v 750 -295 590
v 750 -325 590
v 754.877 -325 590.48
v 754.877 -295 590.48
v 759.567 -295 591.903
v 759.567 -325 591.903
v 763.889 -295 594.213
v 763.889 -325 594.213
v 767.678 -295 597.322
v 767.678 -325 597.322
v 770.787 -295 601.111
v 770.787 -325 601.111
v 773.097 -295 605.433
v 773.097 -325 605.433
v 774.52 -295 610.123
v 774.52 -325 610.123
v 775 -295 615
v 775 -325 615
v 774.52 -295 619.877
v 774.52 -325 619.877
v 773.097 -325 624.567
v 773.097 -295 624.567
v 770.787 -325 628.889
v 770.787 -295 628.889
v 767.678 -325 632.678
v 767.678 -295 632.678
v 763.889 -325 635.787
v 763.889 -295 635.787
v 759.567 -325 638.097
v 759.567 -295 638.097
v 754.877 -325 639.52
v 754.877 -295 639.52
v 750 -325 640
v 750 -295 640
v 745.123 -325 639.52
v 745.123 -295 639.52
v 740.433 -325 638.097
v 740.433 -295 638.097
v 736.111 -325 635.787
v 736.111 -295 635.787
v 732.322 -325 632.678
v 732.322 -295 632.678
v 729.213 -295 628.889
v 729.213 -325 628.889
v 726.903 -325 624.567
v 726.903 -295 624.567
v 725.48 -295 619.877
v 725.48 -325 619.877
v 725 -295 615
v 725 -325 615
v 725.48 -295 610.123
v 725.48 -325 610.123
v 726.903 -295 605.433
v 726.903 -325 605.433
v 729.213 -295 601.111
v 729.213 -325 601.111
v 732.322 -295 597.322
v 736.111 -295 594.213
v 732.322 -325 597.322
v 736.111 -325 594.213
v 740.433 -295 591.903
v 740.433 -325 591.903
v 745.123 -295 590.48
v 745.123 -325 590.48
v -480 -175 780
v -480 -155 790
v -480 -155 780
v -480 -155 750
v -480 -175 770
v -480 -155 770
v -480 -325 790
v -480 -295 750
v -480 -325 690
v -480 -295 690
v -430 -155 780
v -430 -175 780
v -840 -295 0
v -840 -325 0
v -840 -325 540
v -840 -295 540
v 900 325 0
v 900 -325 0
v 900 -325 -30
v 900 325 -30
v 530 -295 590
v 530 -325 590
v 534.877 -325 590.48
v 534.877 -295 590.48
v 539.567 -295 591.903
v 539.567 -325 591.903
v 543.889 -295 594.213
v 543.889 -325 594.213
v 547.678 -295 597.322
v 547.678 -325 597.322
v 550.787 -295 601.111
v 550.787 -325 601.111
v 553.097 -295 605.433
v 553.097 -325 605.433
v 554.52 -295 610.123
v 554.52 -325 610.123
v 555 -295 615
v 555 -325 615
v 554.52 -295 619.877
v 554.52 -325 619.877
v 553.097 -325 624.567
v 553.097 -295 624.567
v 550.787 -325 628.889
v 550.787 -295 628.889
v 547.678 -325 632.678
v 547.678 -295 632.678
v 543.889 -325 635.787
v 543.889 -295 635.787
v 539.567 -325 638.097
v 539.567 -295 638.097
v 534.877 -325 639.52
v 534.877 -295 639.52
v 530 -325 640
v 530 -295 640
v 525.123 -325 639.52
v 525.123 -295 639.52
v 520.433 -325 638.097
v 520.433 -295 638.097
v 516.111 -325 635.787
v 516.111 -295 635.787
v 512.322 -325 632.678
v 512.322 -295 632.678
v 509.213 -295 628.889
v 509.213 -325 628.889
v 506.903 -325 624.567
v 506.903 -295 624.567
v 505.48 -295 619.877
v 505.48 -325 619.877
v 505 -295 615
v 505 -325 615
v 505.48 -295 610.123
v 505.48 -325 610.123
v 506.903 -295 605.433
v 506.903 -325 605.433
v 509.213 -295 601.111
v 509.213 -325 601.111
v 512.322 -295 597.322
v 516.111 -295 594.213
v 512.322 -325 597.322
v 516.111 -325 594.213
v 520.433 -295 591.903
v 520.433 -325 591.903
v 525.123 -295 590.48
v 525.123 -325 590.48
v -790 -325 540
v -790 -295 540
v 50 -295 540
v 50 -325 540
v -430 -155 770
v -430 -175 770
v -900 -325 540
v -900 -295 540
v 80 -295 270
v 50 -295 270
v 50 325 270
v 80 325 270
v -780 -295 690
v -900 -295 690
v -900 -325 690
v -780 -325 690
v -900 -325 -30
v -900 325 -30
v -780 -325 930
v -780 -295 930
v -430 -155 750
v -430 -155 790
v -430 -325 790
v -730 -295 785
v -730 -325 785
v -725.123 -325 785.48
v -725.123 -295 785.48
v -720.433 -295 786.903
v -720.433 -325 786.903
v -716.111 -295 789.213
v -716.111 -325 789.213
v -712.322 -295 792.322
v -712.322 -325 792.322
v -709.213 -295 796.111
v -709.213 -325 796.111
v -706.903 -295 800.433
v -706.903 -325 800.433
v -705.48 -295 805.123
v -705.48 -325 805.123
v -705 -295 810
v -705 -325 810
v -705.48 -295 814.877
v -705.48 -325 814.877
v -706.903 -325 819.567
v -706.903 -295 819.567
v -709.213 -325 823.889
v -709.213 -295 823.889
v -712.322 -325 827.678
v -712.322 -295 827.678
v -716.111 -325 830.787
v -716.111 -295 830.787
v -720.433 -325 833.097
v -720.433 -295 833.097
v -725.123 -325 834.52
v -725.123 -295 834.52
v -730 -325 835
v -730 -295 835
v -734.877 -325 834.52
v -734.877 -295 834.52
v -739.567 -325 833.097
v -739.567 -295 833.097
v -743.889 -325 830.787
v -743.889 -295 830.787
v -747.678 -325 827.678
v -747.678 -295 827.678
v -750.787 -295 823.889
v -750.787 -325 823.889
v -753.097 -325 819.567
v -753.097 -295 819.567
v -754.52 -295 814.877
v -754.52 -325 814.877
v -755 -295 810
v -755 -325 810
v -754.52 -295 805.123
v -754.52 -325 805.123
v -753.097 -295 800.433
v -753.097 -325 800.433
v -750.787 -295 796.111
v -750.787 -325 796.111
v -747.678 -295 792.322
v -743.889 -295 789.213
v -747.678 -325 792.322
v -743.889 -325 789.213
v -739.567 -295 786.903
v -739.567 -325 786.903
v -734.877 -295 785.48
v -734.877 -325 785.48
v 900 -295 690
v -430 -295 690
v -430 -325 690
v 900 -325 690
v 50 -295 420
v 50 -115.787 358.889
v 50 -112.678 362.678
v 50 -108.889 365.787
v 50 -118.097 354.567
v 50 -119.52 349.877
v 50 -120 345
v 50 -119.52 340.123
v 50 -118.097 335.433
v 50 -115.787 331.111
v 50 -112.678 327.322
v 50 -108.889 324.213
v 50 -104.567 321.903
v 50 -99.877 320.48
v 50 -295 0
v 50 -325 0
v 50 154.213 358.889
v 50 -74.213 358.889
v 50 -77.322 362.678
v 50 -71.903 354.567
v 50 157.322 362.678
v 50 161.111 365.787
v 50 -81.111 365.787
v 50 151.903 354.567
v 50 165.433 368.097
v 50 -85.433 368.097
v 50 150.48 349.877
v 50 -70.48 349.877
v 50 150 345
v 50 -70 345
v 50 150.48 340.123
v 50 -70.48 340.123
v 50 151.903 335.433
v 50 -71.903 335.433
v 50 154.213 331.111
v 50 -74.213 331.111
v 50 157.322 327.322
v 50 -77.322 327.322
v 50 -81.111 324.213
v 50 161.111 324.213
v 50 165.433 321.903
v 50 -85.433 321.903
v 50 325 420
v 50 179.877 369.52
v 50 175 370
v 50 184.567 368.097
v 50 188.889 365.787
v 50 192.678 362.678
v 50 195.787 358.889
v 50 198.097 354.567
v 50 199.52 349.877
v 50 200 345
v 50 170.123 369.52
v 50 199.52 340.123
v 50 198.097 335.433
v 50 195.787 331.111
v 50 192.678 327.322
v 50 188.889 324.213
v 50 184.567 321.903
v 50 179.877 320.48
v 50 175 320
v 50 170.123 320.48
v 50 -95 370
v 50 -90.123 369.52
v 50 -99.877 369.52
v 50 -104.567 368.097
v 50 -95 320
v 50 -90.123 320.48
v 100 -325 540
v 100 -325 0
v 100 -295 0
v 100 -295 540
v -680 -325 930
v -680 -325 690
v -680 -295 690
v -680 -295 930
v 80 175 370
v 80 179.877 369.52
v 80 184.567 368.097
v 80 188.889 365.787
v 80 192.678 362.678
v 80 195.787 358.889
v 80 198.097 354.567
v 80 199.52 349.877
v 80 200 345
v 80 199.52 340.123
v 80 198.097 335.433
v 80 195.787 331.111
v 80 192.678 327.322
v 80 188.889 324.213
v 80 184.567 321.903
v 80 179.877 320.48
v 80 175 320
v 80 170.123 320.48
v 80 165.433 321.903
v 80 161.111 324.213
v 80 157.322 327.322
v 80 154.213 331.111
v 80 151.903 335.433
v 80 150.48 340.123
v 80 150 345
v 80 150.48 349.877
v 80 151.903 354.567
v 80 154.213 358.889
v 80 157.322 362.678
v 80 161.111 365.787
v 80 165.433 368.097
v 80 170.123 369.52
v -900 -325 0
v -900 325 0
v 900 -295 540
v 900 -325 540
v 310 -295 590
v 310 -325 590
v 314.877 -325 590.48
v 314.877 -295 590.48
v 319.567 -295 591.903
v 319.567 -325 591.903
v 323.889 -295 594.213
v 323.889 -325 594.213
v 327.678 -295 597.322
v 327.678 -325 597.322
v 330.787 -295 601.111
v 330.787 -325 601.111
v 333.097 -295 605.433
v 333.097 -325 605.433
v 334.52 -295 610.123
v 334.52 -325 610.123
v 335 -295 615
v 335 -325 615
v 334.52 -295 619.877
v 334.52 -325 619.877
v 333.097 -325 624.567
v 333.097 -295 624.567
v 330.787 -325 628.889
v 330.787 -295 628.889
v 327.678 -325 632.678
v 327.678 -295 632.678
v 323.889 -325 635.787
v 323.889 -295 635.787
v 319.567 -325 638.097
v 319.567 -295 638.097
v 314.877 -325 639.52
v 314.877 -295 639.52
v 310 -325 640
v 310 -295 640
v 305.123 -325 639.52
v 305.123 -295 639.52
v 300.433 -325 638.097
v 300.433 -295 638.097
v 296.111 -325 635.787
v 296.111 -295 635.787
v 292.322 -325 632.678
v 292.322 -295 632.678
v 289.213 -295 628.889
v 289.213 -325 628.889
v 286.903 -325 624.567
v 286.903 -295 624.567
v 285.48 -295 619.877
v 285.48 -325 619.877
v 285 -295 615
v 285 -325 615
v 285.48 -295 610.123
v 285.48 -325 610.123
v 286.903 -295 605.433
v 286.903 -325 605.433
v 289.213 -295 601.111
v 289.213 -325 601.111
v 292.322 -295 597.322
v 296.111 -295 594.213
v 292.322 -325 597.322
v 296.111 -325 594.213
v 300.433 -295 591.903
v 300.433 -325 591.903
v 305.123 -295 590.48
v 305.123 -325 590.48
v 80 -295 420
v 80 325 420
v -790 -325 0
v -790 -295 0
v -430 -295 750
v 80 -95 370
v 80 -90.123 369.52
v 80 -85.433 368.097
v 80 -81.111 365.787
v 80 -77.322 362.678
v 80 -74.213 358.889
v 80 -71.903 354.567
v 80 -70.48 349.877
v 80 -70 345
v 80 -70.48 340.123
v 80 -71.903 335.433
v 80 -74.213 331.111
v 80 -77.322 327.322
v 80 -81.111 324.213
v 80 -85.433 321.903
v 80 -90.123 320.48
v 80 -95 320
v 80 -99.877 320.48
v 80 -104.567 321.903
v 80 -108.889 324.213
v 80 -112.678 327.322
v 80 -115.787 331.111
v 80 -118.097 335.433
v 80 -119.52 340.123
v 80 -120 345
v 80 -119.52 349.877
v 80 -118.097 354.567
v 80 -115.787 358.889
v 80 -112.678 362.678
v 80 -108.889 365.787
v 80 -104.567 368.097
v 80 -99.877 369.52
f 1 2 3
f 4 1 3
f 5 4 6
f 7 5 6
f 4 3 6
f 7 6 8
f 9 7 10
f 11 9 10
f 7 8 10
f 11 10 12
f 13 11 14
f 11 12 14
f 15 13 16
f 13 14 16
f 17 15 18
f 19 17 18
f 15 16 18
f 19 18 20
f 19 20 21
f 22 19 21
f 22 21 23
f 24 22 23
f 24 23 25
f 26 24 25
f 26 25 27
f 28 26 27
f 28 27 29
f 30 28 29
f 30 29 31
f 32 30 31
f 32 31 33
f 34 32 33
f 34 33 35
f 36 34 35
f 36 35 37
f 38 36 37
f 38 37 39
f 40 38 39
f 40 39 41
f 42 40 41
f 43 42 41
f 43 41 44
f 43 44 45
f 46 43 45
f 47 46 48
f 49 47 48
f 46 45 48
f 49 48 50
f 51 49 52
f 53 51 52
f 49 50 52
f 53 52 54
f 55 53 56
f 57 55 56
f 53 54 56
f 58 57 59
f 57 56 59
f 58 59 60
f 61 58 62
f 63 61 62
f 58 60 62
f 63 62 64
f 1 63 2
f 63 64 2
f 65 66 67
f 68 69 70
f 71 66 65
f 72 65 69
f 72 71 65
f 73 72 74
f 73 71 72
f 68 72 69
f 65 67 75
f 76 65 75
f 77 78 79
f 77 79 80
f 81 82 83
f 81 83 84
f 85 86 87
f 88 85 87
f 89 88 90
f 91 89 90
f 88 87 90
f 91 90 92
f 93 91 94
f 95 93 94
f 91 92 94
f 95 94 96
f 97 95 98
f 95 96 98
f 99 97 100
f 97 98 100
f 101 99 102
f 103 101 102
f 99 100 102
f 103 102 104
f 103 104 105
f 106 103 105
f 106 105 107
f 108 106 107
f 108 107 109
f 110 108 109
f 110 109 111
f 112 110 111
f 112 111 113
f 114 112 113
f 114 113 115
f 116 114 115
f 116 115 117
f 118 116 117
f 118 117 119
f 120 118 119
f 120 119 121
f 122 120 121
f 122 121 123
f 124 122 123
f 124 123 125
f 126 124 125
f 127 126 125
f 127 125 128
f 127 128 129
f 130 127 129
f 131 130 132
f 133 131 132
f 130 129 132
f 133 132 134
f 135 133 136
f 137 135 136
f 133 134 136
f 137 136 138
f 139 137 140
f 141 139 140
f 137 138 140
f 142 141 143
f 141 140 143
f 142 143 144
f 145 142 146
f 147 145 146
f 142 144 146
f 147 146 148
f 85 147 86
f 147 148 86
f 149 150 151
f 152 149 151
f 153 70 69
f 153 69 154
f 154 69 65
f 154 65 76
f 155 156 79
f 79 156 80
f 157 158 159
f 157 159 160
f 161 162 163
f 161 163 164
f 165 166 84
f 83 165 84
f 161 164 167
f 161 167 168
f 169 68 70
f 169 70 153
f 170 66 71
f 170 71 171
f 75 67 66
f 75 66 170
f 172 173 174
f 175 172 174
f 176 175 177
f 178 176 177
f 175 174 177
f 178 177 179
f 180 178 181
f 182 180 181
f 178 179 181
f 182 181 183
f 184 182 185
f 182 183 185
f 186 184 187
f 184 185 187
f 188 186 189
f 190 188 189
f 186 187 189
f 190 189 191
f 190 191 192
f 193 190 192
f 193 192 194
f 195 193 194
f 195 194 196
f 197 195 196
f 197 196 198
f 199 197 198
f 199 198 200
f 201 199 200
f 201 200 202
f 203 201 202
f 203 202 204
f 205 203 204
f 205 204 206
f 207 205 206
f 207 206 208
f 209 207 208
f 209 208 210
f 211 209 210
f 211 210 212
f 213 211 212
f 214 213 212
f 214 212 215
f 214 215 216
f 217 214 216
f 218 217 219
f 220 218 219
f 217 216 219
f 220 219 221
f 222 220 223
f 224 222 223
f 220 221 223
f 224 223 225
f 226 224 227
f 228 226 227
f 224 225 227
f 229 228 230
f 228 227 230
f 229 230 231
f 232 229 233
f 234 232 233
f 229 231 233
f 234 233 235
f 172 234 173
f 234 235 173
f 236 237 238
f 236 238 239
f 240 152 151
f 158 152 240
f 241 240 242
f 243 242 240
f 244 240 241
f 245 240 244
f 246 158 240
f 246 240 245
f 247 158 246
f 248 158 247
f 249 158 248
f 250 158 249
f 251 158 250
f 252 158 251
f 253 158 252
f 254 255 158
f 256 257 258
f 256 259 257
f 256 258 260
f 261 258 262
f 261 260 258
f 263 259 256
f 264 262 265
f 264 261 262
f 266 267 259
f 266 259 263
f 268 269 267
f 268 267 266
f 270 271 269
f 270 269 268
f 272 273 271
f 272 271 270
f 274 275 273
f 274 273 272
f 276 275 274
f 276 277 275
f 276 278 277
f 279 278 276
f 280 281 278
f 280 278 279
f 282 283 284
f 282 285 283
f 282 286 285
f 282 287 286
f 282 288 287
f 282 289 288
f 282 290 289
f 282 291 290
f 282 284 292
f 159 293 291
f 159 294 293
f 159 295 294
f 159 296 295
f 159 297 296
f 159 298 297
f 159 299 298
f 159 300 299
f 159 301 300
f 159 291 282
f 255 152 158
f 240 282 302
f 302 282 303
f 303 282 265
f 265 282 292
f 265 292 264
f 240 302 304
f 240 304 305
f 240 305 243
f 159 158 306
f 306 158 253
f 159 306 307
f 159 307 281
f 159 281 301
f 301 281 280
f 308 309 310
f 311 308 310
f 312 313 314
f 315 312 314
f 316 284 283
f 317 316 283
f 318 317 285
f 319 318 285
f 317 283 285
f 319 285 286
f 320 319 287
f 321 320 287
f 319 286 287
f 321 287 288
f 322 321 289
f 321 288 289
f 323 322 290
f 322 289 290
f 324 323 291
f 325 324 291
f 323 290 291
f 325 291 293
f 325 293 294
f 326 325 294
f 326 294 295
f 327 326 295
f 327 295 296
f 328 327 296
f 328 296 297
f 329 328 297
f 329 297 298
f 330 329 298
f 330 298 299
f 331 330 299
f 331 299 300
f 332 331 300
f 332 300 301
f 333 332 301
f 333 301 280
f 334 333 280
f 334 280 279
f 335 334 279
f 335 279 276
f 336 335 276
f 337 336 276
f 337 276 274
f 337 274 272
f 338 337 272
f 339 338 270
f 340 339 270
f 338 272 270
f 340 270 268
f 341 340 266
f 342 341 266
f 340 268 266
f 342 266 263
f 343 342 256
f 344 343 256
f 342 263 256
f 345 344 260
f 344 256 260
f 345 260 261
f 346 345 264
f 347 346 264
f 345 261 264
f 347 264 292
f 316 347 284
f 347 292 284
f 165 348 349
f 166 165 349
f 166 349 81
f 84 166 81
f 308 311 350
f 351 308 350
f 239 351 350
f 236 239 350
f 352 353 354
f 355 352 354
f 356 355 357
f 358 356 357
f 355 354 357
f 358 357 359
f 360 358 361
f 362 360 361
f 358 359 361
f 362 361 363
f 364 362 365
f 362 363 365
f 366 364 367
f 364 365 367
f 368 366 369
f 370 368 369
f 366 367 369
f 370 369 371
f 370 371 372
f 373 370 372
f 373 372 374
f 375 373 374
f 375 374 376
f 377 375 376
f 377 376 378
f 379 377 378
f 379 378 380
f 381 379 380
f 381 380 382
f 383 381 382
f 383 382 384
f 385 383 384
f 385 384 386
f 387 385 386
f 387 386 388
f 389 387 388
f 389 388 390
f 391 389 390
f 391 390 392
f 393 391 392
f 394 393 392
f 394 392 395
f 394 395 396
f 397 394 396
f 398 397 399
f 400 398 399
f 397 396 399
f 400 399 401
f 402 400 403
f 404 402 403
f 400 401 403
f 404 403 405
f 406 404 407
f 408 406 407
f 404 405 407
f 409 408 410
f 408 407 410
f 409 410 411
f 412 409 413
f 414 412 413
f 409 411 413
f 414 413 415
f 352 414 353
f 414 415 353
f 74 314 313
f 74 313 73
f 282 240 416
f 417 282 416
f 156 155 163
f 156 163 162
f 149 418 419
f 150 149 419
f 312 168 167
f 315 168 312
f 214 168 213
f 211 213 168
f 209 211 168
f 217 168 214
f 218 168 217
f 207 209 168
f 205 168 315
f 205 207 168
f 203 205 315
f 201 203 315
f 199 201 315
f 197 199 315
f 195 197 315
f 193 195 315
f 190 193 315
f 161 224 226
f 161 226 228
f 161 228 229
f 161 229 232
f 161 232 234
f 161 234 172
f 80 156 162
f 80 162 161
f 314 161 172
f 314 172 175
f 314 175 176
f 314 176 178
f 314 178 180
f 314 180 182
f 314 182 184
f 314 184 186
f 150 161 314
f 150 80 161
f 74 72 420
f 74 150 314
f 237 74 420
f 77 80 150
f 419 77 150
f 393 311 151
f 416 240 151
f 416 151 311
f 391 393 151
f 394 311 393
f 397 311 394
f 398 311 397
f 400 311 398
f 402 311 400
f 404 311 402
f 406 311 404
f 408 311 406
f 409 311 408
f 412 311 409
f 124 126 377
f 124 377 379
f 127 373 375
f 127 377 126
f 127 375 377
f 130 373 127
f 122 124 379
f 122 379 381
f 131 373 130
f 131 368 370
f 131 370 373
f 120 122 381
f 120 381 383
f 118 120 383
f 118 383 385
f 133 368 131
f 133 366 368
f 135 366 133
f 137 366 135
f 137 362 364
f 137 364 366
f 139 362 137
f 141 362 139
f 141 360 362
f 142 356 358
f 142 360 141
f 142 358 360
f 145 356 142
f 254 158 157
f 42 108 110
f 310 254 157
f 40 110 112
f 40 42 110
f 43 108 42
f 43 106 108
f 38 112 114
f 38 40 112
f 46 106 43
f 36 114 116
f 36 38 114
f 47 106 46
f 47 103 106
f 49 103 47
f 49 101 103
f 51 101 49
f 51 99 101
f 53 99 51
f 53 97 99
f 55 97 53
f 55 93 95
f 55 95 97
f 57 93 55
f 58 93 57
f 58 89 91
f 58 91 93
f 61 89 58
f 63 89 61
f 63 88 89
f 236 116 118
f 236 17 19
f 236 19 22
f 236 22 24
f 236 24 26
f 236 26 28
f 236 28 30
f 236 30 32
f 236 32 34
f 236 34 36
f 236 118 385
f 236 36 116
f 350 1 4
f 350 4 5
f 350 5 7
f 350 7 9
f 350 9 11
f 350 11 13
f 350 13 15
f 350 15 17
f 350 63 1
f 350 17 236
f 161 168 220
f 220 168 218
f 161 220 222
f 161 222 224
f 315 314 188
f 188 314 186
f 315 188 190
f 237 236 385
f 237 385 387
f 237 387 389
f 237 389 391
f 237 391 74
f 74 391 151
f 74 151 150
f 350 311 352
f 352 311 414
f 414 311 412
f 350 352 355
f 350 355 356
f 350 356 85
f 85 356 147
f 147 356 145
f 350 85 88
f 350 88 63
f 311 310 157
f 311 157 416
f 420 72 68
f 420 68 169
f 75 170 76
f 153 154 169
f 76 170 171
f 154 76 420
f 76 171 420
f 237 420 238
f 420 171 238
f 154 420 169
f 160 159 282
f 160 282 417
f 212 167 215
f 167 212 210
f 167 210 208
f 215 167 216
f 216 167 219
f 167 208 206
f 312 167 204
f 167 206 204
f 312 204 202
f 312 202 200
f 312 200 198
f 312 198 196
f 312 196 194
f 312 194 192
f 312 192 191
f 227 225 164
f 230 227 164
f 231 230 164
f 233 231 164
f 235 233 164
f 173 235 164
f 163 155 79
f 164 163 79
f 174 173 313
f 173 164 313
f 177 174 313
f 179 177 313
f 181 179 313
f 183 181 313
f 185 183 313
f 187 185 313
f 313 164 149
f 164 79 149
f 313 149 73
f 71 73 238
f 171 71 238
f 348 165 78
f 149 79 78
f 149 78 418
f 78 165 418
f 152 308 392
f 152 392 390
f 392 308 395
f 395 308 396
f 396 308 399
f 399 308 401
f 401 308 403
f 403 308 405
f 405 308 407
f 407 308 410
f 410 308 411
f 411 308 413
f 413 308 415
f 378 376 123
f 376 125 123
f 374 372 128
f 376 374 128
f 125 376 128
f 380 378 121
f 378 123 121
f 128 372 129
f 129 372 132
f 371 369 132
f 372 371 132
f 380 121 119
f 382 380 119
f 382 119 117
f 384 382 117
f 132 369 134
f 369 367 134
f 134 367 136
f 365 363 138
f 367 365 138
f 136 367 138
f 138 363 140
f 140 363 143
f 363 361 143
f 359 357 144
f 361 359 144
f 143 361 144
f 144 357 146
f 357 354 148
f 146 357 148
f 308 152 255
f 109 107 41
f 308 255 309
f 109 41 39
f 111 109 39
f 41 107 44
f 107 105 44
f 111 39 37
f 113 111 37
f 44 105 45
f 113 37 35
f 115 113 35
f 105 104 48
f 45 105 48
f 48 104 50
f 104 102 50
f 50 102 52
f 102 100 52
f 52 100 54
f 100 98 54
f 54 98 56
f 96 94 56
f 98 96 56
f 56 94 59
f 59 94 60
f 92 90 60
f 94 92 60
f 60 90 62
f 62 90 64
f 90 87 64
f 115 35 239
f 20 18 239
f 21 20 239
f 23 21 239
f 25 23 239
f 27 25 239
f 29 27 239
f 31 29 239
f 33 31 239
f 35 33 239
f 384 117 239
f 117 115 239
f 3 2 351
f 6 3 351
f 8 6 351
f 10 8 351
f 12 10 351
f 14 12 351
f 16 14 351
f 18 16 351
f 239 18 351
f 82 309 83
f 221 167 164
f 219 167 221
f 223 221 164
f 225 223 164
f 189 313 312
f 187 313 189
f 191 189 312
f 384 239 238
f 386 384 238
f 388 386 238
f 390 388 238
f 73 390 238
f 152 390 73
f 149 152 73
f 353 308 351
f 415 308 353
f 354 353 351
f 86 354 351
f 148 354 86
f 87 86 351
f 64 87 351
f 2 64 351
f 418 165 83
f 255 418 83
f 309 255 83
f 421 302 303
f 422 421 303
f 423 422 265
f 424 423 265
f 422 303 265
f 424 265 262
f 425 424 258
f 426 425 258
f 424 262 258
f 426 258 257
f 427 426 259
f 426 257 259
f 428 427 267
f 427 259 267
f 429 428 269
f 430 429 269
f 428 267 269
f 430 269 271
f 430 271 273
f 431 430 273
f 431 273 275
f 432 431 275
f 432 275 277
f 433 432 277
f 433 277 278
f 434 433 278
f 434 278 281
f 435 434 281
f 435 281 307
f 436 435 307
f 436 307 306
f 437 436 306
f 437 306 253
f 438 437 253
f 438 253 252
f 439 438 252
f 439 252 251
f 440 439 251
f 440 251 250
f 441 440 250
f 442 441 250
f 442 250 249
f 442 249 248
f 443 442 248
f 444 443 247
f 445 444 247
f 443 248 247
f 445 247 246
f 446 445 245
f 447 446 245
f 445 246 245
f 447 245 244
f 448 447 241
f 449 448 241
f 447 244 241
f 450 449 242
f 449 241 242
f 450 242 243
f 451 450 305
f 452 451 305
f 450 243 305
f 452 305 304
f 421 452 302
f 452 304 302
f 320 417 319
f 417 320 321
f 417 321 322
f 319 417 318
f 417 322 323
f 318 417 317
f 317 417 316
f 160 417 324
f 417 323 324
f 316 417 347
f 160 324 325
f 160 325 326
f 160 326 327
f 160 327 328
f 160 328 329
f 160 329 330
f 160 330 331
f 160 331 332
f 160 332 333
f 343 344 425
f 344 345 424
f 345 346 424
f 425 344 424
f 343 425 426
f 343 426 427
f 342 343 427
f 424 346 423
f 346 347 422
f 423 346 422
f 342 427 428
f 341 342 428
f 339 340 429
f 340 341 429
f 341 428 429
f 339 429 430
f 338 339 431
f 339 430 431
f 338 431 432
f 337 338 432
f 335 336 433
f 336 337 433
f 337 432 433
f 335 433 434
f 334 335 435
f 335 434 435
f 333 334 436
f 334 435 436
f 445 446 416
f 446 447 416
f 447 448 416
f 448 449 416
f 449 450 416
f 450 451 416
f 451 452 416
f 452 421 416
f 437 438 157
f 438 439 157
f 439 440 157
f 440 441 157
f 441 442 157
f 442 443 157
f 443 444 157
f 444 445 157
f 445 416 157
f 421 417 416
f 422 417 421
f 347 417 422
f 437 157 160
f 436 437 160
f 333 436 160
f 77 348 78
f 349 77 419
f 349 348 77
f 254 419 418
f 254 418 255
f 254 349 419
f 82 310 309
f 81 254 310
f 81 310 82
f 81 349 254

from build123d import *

# Parameters (mm, degrees)
SKETCH1_W           = 1800
SKETCH1_H           = 650
BOSS_EXTRUDE1_DEPTH = 30
SKETCH2_W           = 50
SKETCH2_H           = 30
BOSS_EXTRUDE2_DEPTH = 540
SKETCH3_W           = 1800
SKETCH3_H           = 30
BOSS_EXTRUDE4_DEPTH = 150
SKETCH4_W           = 30
SKETCH4_H           = 150
BOSS_EXTRUDE5_DEPTH = 620
SKETCH5_W           = 100
SKETCH5_H           = 30
BOSS_EXTRUDE6_DEPTH = 240
SKETCH6_W           = 50
SKETCH6_H           = 30
BOSS_EXTRUDE7_DEPTH = 100
SKETCH7_W           = 50
SKETCH7_H           = 40
BOSS_EXTRUDE8_DEPTH = 140
SKETCH8_W           = 50
SKETCH8_H           = 10
CUT_EXTRUDE1_DEPTH  = 20
SKETCH9_R           = 25
CUT_EXTRUDE2_DEPTH  = 40
SKETCH10_R          = 25
CUT_EXTRUDE3_DEPTH  = 40
SKETCH11_R          = 25
CUT_EXTRUDE4_DEPTH  = 40


with BuildPart() as part:
    # Sketch1 → Boss-Extrude1 (new body)
    with BuildSketch(Plane.XY):
        Rectangle(SKETCH1_W, SKETCH1_H)
    extrude(amount=-BOSS_EXTRUDE1_DEPTH)

    # Sketch2 → Boss-Extrude2 (add)
    with BuildSketch(Plane.XY):
        with Locations((75, -310)):
            Rectangle(SKETCH2_W, SKETCH2_H)
        with Locations((-815, -310)):
            Rectangle(SKETCH2_W, SKETCH2_H)
    extrude(amount=BOSS_EXTRUDE2_DEPTH)

    # Sketch3 → Boss-Extrude4 (add)
    with BuildSketch(Plane.XY.offset(540)):
        with Locations((0, -310)):
            Rectangle(SKETCH3_W, SKETCH3_H)
    extrude(amount=BOSS_EXTRUDE4_DEPTH)

    # Sketch4 → Boss-Extrude5 (add)
    with BuildSketch(Plane(origin=(0, -295, 0), x_dir=(1, 0, 0), z_dir=(0, 1, 0))):
        with Locations((65, -345)):
            Rectangle(SKETCH4_W, SKETCH4_H)
    extrude(amount=BOSS_EXTRUDE5_DEPTH)

    # Sketch5 → Boss-Extrude6 (add)
    with BuildSketch(Plane.XY.offset(690)):
        with Locations((-730, -310)):
            Rectangle(SKETCH5_W, SKETCH5_H)
    extrude(amount=BOSS_EXTRUDE6_DEPTH)

    # Sketch6 → Boss-Extrude7 (add)
    with BuildSketch(Plane.XY.offset(690)):
        with Locations((-455, -310)):
            Rectangle(SKETCH6_W, SKETCH6_H)
    extrude(amount=BOSS_EXTRUDE7_DEPTH)

    # Sketch7 → Boss-Extrude8 (add)
    with BuildSketch(Plane(origin=(0, -295, 0), x_dir=(1, 0, 0), z_dir=(0, 1, 0))):
        with Locations((-455, -770)):
            Rectangle(SKETCH7_W, SKETCH7_H)
    extrude(amount=BOSS_EXTRUDE8_DEPTH)

    # Sketch8 → Cut-Extrude1 (cut)
    with BuildSketch(Plane(origin=(0, -155, 0), x_dir=(1, 0, 0), z_dir=(0, 1, 0))):
        with Locations((-455, -775)):
            Rectangle(SKETCH8_W, SKETCH8_H)
    extrude(amount=-CUT_EXTRUDE1_DEPTH, mode=Mode.SUBTRACT)

    # Sketch9 → Cut-Extrude2 (cut)
    with BuildSketch(Plane.XZ.offset(325)):
        with Locations(Location((750, 615, 0), (0, 0, 270))):
            Circle(SKETCH9_R)
        with Locations(Location((530, 615, 0), (0, 0, 270))):
            Circle(SKETCH9_R)
        with Locations(Location((310, 615, 0), (0, 0, 270))):
            Circle(SKETCH9_R)
    extrude(amount=-CUT_EXTRUDE2_DEPTH, mode=Mode.SUBTRACT)

    # Sketch10 → Cut-Extrude3 (cut)
    with BuildSketch(Plane.ZY.offset(-50)):
        with Locations((345, -95)):
            Circle(SKETCH10_R)
        with Locations((345, 175)):
            Circle(SKETCH10_R)
    extrude(amount=-CUT_EXTRUDE3_DEPTH, mode=Mode.SUBTRACT)

    # Sketch11 → Cut-Extrude4 (cut)
    with BuildSketch(Plane.XZ.offset(325)):
        with Locations(Location((-730, 810, 0), (0, 0, 270))):
            Circle(SKETCH11_R)
    extrude(amount=-CUT_EXTRUDE4_DEPTH, mode=Mode.SUBTRACT)


solid = part.part
